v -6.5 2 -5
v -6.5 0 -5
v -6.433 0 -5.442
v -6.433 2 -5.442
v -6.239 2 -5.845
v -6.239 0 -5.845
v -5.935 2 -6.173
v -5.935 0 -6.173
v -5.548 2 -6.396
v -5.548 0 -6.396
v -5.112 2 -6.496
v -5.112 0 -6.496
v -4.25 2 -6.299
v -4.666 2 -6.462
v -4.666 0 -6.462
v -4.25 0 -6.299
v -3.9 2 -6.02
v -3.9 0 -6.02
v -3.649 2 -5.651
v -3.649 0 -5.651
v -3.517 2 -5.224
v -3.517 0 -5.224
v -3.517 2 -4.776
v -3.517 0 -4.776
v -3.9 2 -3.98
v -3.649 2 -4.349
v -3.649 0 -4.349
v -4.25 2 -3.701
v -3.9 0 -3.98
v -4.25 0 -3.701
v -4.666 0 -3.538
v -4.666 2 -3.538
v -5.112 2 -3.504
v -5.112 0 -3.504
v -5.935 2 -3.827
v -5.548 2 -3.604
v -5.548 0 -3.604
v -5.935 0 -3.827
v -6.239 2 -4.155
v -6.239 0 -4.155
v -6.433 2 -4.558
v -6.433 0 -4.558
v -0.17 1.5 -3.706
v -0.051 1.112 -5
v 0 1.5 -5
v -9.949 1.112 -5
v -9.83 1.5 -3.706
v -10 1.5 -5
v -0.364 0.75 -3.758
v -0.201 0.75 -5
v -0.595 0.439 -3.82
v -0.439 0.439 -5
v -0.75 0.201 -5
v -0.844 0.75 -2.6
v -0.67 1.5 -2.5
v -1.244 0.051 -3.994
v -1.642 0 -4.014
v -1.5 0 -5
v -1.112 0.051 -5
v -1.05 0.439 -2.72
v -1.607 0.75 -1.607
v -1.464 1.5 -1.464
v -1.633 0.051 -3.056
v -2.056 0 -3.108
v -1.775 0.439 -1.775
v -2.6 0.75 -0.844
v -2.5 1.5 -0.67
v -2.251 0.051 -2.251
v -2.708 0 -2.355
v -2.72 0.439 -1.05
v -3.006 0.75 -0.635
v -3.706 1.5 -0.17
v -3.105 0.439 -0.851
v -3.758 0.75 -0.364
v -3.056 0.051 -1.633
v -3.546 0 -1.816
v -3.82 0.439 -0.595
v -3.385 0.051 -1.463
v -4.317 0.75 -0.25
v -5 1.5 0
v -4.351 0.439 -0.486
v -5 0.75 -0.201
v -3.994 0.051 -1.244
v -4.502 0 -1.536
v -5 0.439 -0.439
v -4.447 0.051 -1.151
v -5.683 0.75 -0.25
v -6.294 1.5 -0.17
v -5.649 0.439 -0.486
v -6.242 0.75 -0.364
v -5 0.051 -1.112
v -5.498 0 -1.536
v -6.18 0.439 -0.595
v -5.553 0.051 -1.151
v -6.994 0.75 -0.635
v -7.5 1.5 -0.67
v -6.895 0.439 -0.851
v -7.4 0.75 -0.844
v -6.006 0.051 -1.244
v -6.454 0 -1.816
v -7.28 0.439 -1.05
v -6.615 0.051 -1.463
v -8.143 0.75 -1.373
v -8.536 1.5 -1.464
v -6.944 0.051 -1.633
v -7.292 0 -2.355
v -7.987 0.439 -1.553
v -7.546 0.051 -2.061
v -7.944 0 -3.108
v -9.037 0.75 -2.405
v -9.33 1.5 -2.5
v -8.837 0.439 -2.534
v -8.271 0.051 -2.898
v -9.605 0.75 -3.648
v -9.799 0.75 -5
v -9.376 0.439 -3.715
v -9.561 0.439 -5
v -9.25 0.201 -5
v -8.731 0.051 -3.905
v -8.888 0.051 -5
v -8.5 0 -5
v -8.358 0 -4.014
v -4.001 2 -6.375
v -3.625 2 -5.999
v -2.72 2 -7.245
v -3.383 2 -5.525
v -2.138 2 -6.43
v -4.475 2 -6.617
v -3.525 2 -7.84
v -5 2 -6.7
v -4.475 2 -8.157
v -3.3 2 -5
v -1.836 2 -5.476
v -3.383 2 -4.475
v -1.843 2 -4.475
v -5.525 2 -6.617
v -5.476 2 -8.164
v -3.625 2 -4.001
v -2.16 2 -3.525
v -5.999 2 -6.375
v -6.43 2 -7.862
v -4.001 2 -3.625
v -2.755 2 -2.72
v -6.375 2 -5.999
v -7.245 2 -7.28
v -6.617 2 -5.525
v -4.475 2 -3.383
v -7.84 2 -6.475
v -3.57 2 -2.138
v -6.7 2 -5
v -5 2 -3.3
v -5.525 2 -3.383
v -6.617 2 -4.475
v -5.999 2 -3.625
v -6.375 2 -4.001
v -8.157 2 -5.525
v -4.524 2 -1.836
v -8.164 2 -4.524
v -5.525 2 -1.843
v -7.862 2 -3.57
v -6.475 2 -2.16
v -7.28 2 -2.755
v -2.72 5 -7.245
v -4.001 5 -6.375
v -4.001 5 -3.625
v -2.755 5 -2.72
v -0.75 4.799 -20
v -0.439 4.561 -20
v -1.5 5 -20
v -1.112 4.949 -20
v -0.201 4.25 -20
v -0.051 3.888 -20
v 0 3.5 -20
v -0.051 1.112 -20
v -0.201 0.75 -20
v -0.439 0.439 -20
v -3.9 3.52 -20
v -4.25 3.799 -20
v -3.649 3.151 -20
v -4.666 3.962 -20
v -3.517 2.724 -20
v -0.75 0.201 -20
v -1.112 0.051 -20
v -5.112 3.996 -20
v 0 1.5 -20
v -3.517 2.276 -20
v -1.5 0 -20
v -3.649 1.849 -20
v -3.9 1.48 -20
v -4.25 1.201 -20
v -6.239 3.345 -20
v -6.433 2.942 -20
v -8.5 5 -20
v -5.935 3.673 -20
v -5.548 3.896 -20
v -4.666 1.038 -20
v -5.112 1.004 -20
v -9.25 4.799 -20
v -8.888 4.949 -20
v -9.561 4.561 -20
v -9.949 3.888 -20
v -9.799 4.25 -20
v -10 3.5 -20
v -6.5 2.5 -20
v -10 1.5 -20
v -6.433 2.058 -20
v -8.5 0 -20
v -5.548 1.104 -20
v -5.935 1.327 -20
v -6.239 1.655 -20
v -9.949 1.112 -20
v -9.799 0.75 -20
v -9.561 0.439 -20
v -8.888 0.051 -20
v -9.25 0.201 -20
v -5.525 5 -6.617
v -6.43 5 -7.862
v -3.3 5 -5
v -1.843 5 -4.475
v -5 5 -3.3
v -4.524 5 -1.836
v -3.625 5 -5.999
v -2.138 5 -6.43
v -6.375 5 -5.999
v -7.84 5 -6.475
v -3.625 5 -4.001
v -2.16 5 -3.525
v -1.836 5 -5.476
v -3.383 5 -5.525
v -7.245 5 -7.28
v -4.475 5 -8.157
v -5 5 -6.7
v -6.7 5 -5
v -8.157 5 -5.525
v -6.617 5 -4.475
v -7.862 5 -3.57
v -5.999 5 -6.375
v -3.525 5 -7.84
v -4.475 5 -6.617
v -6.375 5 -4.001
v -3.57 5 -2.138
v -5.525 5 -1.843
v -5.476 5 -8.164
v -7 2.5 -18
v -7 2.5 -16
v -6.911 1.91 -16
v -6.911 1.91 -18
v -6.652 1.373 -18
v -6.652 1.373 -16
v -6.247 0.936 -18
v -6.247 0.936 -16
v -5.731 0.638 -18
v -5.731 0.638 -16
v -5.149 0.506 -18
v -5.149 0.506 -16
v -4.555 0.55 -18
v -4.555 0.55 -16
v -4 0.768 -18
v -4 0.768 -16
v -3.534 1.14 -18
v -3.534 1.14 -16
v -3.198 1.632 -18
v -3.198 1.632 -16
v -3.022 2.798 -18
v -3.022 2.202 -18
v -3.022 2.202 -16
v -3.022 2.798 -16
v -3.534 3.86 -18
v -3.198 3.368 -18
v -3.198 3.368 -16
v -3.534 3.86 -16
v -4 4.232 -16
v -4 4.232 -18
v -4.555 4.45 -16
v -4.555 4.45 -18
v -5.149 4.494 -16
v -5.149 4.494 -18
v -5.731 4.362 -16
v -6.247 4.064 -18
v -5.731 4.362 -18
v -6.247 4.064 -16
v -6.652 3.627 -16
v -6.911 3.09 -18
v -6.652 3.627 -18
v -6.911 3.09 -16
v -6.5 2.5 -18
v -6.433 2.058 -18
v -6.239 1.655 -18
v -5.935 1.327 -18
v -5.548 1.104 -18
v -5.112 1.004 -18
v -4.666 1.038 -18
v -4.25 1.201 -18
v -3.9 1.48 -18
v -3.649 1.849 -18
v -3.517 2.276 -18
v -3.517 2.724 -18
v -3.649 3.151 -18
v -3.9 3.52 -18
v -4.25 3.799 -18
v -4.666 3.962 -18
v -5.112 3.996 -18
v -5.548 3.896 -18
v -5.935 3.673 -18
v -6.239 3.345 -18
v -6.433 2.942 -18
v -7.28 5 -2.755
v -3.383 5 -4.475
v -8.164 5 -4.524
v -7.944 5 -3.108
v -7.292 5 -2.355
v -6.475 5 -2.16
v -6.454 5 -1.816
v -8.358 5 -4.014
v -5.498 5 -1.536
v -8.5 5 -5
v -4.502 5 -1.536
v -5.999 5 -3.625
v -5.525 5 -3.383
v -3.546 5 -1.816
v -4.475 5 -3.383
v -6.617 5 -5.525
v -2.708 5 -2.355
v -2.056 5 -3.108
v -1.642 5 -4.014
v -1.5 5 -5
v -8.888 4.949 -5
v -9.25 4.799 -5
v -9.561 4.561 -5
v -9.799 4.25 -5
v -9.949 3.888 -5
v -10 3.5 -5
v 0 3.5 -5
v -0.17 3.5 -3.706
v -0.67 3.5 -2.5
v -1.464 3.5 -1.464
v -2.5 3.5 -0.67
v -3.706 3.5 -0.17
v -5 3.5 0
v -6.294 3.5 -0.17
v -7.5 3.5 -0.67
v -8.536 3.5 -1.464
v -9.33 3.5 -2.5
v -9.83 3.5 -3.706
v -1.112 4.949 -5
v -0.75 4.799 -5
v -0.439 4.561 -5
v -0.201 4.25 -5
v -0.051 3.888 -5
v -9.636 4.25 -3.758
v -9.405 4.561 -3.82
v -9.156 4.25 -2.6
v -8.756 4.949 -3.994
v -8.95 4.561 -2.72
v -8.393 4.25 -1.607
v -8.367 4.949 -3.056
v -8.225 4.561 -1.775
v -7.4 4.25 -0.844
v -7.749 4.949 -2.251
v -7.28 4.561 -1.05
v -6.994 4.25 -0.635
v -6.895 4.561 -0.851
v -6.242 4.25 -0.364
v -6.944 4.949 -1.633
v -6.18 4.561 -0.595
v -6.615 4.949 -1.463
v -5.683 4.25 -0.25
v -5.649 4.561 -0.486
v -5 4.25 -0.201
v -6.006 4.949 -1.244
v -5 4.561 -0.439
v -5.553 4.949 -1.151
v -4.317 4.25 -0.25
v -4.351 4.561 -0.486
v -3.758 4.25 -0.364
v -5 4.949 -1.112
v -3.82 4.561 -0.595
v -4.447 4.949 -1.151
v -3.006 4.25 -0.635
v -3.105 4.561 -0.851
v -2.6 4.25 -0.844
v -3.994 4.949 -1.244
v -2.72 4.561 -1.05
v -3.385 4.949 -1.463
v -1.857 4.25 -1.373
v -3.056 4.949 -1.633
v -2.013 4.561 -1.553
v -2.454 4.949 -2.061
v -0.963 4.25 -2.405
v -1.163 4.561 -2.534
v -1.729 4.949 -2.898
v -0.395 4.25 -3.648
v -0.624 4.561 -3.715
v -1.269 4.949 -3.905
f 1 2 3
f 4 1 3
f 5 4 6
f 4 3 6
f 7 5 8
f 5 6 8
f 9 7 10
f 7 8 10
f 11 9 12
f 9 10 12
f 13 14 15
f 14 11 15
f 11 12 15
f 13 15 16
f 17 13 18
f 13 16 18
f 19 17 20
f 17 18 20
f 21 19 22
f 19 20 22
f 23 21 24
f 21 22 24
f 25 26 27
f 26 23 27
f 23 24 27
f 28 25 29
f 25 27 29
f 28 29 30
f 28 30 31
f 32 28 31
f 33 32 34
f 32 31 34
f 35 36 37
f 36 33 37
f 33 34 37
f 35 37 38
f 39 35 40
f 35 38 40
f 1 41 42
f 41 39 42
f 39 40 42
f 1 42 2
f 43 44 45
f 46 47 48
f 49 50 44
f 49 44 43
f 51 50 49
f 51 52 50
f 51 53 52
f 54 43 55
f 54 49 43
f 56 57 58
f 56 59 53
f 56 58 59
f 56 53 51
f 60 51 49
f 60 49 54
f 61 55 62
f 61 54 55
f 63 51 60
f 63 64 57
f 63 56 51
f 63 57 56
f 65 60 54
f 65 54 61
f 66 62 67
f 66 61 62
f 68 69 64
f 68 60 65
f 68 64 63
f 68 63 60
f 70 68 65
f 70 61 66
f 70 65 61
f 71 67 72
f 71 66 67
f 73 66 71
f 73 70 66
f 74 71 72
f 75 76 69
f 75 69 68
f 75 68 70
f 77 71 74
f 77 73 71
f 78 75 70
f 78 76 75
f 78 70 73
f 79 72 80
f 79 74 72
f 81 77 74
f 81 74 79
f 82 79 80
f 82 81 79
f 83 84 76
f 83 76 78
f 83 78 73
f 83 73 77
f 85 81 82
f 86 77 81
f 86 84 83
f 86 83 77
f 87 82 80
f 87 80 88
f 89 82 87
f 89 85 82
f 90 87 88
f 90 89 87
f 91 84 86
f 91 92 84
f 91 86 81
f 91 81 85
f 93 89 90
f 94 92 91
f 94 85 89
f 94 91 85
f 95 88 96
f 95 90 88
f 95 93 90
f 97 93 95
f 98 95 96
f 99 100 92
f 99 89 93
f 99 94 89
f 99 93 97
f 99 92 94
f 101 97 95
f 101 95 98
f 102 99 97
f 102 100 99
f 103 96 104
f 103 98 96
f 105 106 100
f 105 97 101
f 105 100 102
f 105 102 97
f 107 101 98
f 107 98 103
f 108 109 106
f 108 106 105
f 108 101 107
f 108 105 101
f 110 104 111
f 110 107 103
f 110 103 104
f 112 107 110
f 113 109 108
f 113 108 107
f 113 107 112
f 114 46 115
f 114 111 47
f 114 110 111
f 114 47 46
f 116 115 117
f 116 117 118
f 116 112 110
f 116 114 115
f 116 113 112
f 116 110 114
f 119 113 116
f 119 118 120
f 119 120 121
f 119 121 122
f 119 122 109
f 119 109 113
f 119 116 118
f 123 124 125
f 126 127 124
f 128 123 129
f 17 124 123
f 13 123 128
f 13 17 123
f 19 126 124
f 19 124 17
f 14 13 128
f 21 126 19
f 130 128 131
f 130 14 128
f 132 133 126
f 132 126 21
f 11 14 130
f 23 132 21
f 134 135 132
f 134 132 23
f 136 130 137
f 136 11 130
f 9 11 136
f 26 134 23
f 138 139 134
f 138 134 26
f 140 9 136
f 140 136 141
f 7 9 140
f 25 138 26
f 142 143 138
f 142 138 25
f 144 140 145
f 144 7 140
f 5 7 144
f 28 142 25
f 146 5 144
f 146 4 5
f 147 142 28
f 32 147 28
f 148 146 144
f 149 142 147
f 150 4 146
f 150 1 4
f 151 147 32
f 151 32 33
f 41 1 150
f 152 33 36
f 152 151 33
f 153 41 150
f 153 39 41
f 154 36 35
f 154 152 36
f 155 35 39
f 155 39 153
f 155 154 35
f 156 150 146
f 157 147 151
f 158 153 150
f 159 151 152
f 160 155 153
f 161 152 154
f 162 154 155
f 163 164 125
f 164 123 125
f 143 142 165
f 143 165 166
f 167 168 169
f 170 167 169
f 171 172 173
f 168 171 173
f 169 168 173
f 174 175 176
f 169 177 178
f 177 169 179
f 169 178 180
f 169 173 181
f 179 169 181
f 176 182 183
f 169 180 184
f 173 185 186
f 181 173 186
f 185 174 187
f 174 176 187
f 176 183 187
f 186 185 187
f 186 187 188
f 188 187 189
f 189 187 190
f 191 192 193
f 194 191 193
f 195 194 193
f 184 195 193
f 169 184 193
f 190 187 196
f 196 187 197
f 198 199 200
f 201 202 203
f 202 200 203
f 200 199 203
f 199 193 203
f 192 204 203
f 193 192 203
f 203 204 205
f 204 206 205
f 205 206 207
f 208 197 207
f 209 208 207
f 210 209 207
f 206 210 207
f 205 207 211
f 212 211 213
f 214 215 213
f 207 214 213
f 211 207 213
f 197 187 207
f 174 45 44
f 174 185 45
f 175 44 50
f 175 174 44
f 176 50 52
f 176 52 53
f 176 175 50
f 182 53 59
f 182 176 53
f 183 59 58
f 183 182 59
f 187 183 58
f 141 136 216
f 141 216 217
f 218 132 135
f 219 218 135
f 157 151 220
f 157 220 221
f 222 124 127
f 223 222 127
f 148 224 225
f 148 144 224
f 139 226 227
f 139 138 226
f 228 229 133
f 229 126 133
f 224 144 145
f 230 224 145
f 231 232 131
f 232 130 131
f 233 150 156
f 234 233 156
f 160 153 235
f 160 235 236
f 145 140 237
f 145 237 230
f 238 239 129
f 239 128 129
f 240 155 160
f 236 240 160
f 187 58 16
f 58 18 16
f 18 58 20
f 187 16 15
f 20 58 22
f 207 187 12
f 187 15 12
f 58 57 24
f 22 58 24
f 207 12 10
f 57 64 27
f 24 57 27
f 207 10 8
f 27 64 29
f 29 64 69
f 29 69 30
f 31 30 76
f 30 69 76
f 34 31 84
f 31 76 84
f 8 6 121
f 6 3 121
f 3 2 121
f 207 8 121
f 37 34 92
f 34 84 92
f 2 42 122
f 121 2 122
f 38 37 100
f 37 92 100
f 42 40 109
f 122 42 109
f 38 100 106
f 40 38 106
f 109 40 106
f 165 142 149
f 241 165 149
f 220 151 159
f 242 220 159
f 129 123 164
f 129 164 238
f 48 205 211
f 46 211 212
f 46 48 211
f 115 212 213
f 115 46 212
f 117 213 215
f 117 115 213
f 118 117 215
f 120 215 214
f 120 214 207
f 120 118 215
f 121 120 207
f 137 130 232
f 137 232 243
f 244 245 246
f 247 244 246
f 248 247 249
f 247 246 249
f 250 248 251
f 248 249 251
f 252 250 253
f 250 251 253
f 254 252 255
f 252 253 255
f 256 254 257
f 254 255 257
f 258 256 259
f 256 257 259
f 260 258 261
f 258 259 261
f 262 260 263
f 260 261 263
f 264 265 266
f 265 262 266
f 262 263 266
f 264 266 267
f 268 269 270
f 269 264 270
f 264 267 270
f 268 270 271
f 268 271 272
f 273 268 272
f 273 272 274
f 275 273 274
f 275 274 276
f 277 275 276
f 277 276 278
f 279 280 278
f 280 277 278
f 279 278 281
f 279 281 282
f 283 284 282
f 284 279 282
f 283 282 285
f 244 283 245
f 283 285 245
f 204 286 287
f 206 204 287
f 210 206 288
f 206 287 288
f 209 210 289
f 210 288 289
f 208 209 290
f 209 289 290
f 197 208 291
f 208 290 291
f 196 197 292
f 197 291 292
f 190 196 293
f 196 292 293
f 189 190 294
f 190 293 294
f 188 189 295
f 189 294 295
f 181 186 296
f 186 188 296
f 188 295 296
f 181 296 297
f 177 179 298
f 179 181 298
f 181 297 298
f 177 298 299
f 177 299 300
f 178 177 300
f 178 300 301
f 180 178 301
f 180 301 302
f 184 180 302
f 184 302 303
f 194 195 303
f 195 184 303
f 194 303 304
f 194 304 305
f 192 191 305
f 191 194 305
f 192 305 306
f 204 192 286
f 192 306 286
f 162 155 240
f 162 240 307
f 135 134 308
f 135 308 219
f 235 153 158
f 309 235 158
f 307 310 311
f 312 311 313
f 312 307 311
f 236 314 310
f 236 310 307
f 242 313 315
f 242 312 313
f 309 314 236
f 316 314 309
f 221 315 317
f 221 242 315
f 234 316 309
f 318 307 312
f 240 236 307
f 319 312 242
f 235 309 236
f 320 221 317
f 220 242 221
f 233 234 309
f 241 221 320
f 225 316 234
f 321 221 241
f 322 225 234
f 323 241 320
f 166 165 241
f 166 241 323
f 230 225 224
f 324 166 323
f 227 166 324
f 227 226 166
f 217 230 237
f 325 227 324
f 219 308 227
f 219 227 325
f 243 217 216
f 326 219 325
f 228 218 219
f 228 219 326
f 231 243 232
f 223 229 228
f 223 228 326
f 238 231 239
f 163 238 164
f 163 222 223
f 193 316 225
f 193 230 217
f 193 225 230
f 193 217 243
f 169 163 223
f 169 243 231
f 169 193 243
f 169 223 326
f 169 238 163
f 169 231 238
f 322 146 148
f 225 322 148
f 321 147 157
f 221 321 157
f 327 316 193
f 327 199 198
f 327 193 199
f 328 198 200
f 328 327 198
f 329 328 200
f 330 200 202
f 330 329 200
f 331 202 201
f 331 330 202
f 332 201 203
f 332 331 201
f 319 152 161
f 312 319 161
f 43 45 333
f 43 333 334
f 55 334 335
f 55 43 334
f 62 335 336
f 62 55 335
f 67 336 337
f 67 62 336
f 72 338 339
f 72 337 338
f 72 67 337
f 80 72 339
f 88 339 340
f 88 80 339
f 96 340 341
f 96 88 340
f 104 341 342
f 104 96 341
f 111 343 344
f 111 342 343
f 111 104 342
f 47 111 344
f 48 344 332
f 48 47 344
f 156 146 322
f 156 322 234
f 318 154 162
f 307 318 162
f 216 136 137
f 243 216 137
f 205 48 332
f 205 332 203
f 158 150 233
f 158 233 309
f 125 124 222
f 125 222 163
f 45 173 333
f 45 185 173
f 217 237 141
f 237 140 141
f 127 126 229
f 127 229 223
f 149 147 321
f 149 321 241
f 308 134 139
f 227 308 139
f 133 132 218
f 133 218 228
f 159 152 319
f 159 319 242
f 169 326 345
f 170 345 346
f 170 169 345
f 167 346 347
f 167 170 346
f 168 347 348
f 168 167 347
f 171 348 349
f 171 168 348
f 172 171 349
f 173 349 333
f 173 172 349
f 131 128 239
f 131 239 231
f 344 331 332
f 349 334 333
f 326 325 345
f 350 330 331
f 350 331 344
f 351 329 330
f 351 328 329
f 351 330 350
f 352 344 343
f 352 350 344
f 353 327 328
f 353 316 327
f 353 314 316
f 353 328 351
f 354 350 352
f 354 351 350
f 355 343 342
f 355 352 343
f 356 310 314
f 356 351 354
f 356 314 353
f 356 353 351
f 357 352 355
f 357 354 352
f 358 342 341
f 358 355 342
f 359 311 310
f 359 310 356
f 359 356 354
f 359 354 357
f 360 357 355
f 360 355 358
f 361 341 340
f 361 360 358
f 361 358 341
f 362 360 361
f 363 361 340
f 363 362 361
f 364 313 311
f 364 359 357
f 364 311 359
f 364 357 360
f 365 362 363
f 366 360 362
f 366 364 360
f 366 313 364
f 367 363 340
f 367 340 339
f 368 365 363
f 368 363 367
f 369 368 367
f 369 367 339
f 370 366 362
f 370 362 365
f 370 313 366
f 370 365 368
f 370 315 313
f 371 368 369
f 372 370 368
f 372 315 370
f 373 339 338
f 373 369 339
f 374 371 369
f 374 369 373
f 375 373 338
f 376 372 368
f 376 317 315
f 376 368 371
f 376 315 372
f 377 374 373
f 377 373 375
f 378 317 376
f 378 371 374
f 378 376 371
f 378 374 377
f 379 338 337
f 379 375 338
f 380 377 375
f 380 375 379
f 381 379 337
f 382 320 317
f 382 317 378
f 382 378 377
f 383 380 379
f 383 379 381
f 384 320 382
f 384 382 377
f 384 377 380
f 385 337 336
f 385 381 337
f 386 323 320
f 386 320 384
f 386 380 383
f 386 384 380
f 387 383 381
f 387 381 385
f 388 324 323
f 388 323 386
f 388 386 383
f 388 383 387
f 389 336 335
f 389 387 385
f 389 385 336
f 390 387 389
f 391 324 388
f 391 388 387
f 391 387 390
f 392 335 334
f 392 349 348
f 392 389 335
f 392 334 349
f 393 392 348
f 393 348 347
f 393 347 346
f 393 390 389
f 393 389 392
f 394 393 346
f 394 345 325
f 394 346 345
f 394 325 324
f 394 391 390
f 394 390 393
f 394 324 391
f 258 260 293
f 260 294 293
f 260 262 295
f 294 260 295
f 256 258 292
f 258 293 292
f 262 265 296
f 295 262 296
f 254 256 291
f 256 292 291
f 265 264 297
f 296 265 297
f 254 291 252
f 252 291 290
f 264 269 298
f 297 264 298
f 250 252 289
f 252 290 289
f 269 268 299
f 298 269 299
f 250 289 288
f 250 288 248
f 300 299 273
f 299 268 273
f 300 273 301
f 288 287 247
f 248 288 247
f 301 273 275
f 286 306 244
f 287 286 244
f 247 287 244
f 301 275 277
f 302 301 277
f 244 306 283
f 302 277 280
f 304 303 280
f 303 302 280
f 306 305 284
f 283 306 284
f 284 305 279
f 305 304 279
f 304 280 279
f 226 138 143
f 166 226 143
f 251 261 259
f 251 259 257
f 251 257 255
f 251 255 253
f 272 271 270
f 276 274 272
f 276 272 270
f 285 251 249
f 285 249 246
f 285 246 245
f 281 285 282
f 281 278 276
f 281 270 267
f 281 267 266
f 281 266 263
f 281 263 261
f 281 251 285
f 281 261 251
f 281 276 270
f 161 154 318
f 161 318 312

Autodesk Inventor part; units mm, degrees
ref_plane "YZ Plane" through (0, 0, 0) normal (1, 0, 0) x (0, 1, 0)
ref_plane "XZ Plane" through (0, 0, 0) normal (0, 1, 0) x (-1, 0, 0)
sketch "Horn Base Profile" plane through (0, 0, 0) normal (0, 1, 0) x (-1, 0, 0)
  line L0 (0, 0) -> (10, 0) construction
  line L1 (10, 0) -> (10, -20) construction
  line L2 (10, -20) -> (0, -20) construction
  line L3 (0, -20) -> (0, 0) construction
  arc A0 (10, -5) -> (0, -5) centre (5, -5) ccw
  line L4 (10, -5) -> (10, -20)
  line L5 (0, -20) -> (10, -20)
  line L6 (0, -20) -> (0, -5)
  circle A1 centre (5, -5) radius 1.5
  dimension "d0" = 10
  dimension "d1" = 20
  dimension "d2" = 3
extrude "Horn Base" add sketch "Horn Base Profile" along normal blind 2
sketch "Spline Profile" plane through (0, 2, 0) normal (0, 1, 0) x (1, 0, 0)
  line L0 (-10, 20) -> (-10, 5) projected
  arc A0 (-10, 5) -> (0, 5) centre (-5, 5) ccw projected
  line L1 (0, 5) -> (0, 20) projected
  line L2 (0, 20) -> (-10, 20) projected
  circle A1 centre (-5, 5) radius 1.7 construction
  circle A2 centre (-5, 5) radius 3.2 construction
  line L3 (-5, 5) -> (-5, 3.3) construction
  line L4 (-5, 5) -> (-5.5253, 3.3832) construction
  line L5 (-5, 3.3) -> (-5.5253, 1.8434)
  line L6 (-5.5253, 3.3832) -> (-5.5253, 1.8434)
  line L7 (-4.4747, 3.3832) -> (-4.5242, 1.8356)
  line L8 (-5, 3.3) -> (-4.5242, 1.8356)
  line L9 (-4.0008, 3.6247) -> (-3.5696, 2.1375)
  line L10 (-4.4747, 3.3832) -> (-3.5696, 2.1375)
  line L11 (-3.6247, 4.0008) -> (-2.755, 2.7196)
  line L12 (-4.0008, 3.6247) -> (-2.755, 2.7196)
  line L13 (-3.3832, 4.4747) -> (-2.1602, 3.5249)
  line L14 (-3.6247, 4.0008) -> (-2.1602, 3.5249)
  line L15 (-3.3, 5) -> (-1.8434, 4.4747)
  line L16 (-3.3832, 4.4747) -> (-1.8434, 4.4747)
  line L17 (-3.3832, 5.5253) -> (-1.8356, 5.4758)
  line L18 (-3.3, 5) -> (-1.8356, 5.4758)
  line L19 (-3.6247, 5.9992) -> (-2.1375, 6.4304)
  line L20 (-3.3832, 5.5253) -> (-2.1375, 6.4304)
  line L21 (-4.0008, 6.3753) -> (-2.7196, 7.245)
  line L22 (-3.6247, 5.9992) -> (-2.7196, 7.245)
  line L23 (-4.4747, 6.6168) -> (-3.5249, 7.8398)
  line L24 (-4.0008, 6.3753) -> (-3.5249, 7.8398)
  line L25 (-5, 6.7) -> (-4.4747, 8.1566)
  line L26 (-4.4747, 6.6168) -> (-4.4747, 8.1566)
  line L27 (-5.5253, 6.6168) -> (-5.4758, 8.1644)
  line L28 (-5, 6.7) -> (-5.4758, 8.1644)
  line L29 (-5.9992, 6.3753) -> (-6.4304, 7.8625)
  line L30 (-5.5253, 6.6168) -> (-6.4304, 7.8625)
  line L31 (-6.3753, 5.9992) -> (-7.245, 7.2804)
  line L32 (-5.9992, 6.3753) -> (-7.245, 7.2804)
  line L33 (-6.6168, 5.5253) -> (-7.8398, 6.4751)
  line L34 (-6.3753, 5.9992) -> (-7.8398, 6.4751)
  line L35 (-6.7, 5) -> (-8.1566, 5.5253)
  line L36 (-6.6168, 5.5253) -> (-8.1566, 5.5253)
  line L37 (-6.6168, 4.4747) -> (-8.1644, 4.5242)
  line L38 (-6.7, 5) -> (-8.1644, 4.5242)
  line L39 (-6.3753, 4.0008) -> (-7.8625, 3.5696)
  line L40 (-6.6168, 4.4747) -> (-7.8625, 3.5696)
  line L41 (-5.9992, 3.6247) -> (-7.2804, 2.755)
  line L42 (-6.3753, 4.0008) -> (-7.2804, 2.755)
  line L43 (-5.5253, 3.3832) -> (-6.4751, 2.1602)
  line L44 (-5.9992, 3.6247) -> (-6.4751, 2.1602)
  point P0 (0, 0)
  dimension "d5" = 3.4
  dimension "d6" = 1.5
  dimension "d7" = 18
  dimension "d11" = 360
extrude "Servo Spline Cut" add sketch "Spline Profile" along normal blind 3
ref_plane "Work Plane (Clip Axis)" through (0, 2.5, 0) normal (0, 1, 0) x (1, 0, 0)
sketch "Clip Cut Profile" plane through (0, 2.5, 0) normal (0, 1, 0) x (1, 0, 0)
  line L0 (0, 20) -> (-10, 20) construction
  arc A0 (-10, 5) -> (0, 5) centre (-5, 5) ccw construction
  line L1 (0, 5) -> (0, 20) construction
  line L2 (0, 20) -> (-10, 20) construction
  line L3 (-10, 20) -> (-10, 5) construction
  line L4 (-4.4747, 3.3832) -> (-4.5242, 1.8356) construction
  line L5 (-4.5242, 1.8356) -> (-5, 3.3) construction
  line L6 (-5, 3.3) -> (-5.5253, 1.8434) construction
  line L7 (-5.5253, 1.8434) -> (-5.5253, 3.3832) construction
  line L8 (-5.5253, 3.3832) -> (-6.4751, 2.1602) construction
  line L9 (-6.4751, 2.1602) -> (-5.9992, 3.6247) construction
  line L10 (-5.9992, 3.6247) -> (-7.2804, 2.755) construction
  line L11 (-7.2804, 2.755) -> (-6.3753, 4.0008) construction
  line L12 (-6.3753, 4.0008) -> (-7.8625, 3.5696) construction
  line L13 (-7.8625, 3.5696) -> (-6.6168, 4.4747) construction
  line L14 (-6.6168, 4.4747) -> (-8.1644, 4.5242) construction
  line L15 (-8.1644, 4.5242) -> (-6.7, 5) construction
  line L16 (-6.7, 5) -> (-8.1566, 5.5253) construction
  line L17 (-8.1566, 5.5253) -> (-6.6168, 5.5253) construction
  line L18 (-6.6168, 5.5253) -> (-7.8398, 6.4751) construction
  line L19 (-7.8398, 6.4751) -> (-6.3753, 5.9992) construction
  line L20 (-6.3753, 5.9992) -> (-7.245, 7.2804) construction
  line L21 (-7.245, 7.2804) -> (-5.9992, 6.3753) construction
  line L22 (-5.9992, 6.3753) -> (-6.4304, 7.8625) construction
  line L23 (-6.4304, 7.8625) -> (-5.5253, 6.6168) construction
  line L24 (-5.5253, 6.6168) -> (-5.4758, 8.1644) construction
  line L25 (-5.4758, 8.1644) -> (-5, 6.7) construction
  line L26 (-5, 6.7) -> (-4.4747, 8.1566) construction
  line L27 (-4.4747, 8.1566) -> (-4.4747, 6.6168) construction
  line L28 (-4.4747, 6.6168) -> (-3.5249, 7.8398) construction
  line L29 (-3.5249, 7.8398) -> (-4.0008, 6.3753) construction
  line L30 (-4.0008, 6.3753) -> (-2.7196, 7.245) construction
  line L31 (-2.7196, 7.245) -> (-3.6247, 5.9992) construction
  line L32 (-3.6247, 5.9992) -> (-2.1375, 6.4304) construction
  line L33 (-2.1375, 6.4304) -> (-3.3832, 5.5253) construction
  line L34 (-3.3832, 5.5253) -> (-1.8356, 5.4758) construction
  line L35 (-1.8356, 5.4758) -> (-3.3, 5) construction
  line L36 (-3.3, 5) -> (-1.8434, 4.4747) construction
  line L37 (-1.8434, 4.4747) -> (-3.3832, 4.4747) construction
  line L38 (-3.3832, 4.4747) -> (-2.1602, 3.5249) construction
  line L39 (-2.1602, 3.5249) -> (-3.6247, 4.0008) construction
  line L40 (-3.6247, 4.0008) -> (-2.755, 2.7196) construction
  line L41 (-2.755, 2.7196) -> (-4.0008, 3.6247) construction
  line L42 (-4.0008, 3.6247) -> (-3.5696, 2.1375) construction
  line L43 (-3.5696, 2.1375) -> (-4.4747, 3.3832) construction
  line L44 (0, 5) -> (0, 20) construction
  line L45 (0, 20) -> (-10, 20) projected
  line L46 (-5, 20) -> (-6.5, 20)
  line L47 (-6.5, 20) -> (-6.5, 18)
  line L48 (-6.5, 18) -> (-5, 18)
  line L49 (-5, 18) -> (-5, 20)
  line L50 (-5, 18) -> (-7, 18)
  line L51 (-7, 18) -> (-7, 16)
  line L52 (-7, 16) -> (-5, 16)
  line L53 (-5, 16) -> (-5, 18)
  point P0 (0, 0)
  point P1 (-6.5, 18)
  dimension "d16" = 1.5
  dimension "d17" = 2
  dimension "d18" = 2
  dimension "d19" = 2
revolve "Fin Clip Cut" cut sketch "Clip Cut Profile" angle 360 about axis through (-5, 2.5, -18) along (0, 0, -1)
fillet "Fillets (Horn Edges)" radius 1.5 6 edges at (-5, 5, 0) (0, 5, -12.5) (-10, 5, -12.5) (-5, 0, 0) (0, 0, -12.5) (-10, 0, -12.5)
properties part number "flipper_robot_v2_servo_adapter"
